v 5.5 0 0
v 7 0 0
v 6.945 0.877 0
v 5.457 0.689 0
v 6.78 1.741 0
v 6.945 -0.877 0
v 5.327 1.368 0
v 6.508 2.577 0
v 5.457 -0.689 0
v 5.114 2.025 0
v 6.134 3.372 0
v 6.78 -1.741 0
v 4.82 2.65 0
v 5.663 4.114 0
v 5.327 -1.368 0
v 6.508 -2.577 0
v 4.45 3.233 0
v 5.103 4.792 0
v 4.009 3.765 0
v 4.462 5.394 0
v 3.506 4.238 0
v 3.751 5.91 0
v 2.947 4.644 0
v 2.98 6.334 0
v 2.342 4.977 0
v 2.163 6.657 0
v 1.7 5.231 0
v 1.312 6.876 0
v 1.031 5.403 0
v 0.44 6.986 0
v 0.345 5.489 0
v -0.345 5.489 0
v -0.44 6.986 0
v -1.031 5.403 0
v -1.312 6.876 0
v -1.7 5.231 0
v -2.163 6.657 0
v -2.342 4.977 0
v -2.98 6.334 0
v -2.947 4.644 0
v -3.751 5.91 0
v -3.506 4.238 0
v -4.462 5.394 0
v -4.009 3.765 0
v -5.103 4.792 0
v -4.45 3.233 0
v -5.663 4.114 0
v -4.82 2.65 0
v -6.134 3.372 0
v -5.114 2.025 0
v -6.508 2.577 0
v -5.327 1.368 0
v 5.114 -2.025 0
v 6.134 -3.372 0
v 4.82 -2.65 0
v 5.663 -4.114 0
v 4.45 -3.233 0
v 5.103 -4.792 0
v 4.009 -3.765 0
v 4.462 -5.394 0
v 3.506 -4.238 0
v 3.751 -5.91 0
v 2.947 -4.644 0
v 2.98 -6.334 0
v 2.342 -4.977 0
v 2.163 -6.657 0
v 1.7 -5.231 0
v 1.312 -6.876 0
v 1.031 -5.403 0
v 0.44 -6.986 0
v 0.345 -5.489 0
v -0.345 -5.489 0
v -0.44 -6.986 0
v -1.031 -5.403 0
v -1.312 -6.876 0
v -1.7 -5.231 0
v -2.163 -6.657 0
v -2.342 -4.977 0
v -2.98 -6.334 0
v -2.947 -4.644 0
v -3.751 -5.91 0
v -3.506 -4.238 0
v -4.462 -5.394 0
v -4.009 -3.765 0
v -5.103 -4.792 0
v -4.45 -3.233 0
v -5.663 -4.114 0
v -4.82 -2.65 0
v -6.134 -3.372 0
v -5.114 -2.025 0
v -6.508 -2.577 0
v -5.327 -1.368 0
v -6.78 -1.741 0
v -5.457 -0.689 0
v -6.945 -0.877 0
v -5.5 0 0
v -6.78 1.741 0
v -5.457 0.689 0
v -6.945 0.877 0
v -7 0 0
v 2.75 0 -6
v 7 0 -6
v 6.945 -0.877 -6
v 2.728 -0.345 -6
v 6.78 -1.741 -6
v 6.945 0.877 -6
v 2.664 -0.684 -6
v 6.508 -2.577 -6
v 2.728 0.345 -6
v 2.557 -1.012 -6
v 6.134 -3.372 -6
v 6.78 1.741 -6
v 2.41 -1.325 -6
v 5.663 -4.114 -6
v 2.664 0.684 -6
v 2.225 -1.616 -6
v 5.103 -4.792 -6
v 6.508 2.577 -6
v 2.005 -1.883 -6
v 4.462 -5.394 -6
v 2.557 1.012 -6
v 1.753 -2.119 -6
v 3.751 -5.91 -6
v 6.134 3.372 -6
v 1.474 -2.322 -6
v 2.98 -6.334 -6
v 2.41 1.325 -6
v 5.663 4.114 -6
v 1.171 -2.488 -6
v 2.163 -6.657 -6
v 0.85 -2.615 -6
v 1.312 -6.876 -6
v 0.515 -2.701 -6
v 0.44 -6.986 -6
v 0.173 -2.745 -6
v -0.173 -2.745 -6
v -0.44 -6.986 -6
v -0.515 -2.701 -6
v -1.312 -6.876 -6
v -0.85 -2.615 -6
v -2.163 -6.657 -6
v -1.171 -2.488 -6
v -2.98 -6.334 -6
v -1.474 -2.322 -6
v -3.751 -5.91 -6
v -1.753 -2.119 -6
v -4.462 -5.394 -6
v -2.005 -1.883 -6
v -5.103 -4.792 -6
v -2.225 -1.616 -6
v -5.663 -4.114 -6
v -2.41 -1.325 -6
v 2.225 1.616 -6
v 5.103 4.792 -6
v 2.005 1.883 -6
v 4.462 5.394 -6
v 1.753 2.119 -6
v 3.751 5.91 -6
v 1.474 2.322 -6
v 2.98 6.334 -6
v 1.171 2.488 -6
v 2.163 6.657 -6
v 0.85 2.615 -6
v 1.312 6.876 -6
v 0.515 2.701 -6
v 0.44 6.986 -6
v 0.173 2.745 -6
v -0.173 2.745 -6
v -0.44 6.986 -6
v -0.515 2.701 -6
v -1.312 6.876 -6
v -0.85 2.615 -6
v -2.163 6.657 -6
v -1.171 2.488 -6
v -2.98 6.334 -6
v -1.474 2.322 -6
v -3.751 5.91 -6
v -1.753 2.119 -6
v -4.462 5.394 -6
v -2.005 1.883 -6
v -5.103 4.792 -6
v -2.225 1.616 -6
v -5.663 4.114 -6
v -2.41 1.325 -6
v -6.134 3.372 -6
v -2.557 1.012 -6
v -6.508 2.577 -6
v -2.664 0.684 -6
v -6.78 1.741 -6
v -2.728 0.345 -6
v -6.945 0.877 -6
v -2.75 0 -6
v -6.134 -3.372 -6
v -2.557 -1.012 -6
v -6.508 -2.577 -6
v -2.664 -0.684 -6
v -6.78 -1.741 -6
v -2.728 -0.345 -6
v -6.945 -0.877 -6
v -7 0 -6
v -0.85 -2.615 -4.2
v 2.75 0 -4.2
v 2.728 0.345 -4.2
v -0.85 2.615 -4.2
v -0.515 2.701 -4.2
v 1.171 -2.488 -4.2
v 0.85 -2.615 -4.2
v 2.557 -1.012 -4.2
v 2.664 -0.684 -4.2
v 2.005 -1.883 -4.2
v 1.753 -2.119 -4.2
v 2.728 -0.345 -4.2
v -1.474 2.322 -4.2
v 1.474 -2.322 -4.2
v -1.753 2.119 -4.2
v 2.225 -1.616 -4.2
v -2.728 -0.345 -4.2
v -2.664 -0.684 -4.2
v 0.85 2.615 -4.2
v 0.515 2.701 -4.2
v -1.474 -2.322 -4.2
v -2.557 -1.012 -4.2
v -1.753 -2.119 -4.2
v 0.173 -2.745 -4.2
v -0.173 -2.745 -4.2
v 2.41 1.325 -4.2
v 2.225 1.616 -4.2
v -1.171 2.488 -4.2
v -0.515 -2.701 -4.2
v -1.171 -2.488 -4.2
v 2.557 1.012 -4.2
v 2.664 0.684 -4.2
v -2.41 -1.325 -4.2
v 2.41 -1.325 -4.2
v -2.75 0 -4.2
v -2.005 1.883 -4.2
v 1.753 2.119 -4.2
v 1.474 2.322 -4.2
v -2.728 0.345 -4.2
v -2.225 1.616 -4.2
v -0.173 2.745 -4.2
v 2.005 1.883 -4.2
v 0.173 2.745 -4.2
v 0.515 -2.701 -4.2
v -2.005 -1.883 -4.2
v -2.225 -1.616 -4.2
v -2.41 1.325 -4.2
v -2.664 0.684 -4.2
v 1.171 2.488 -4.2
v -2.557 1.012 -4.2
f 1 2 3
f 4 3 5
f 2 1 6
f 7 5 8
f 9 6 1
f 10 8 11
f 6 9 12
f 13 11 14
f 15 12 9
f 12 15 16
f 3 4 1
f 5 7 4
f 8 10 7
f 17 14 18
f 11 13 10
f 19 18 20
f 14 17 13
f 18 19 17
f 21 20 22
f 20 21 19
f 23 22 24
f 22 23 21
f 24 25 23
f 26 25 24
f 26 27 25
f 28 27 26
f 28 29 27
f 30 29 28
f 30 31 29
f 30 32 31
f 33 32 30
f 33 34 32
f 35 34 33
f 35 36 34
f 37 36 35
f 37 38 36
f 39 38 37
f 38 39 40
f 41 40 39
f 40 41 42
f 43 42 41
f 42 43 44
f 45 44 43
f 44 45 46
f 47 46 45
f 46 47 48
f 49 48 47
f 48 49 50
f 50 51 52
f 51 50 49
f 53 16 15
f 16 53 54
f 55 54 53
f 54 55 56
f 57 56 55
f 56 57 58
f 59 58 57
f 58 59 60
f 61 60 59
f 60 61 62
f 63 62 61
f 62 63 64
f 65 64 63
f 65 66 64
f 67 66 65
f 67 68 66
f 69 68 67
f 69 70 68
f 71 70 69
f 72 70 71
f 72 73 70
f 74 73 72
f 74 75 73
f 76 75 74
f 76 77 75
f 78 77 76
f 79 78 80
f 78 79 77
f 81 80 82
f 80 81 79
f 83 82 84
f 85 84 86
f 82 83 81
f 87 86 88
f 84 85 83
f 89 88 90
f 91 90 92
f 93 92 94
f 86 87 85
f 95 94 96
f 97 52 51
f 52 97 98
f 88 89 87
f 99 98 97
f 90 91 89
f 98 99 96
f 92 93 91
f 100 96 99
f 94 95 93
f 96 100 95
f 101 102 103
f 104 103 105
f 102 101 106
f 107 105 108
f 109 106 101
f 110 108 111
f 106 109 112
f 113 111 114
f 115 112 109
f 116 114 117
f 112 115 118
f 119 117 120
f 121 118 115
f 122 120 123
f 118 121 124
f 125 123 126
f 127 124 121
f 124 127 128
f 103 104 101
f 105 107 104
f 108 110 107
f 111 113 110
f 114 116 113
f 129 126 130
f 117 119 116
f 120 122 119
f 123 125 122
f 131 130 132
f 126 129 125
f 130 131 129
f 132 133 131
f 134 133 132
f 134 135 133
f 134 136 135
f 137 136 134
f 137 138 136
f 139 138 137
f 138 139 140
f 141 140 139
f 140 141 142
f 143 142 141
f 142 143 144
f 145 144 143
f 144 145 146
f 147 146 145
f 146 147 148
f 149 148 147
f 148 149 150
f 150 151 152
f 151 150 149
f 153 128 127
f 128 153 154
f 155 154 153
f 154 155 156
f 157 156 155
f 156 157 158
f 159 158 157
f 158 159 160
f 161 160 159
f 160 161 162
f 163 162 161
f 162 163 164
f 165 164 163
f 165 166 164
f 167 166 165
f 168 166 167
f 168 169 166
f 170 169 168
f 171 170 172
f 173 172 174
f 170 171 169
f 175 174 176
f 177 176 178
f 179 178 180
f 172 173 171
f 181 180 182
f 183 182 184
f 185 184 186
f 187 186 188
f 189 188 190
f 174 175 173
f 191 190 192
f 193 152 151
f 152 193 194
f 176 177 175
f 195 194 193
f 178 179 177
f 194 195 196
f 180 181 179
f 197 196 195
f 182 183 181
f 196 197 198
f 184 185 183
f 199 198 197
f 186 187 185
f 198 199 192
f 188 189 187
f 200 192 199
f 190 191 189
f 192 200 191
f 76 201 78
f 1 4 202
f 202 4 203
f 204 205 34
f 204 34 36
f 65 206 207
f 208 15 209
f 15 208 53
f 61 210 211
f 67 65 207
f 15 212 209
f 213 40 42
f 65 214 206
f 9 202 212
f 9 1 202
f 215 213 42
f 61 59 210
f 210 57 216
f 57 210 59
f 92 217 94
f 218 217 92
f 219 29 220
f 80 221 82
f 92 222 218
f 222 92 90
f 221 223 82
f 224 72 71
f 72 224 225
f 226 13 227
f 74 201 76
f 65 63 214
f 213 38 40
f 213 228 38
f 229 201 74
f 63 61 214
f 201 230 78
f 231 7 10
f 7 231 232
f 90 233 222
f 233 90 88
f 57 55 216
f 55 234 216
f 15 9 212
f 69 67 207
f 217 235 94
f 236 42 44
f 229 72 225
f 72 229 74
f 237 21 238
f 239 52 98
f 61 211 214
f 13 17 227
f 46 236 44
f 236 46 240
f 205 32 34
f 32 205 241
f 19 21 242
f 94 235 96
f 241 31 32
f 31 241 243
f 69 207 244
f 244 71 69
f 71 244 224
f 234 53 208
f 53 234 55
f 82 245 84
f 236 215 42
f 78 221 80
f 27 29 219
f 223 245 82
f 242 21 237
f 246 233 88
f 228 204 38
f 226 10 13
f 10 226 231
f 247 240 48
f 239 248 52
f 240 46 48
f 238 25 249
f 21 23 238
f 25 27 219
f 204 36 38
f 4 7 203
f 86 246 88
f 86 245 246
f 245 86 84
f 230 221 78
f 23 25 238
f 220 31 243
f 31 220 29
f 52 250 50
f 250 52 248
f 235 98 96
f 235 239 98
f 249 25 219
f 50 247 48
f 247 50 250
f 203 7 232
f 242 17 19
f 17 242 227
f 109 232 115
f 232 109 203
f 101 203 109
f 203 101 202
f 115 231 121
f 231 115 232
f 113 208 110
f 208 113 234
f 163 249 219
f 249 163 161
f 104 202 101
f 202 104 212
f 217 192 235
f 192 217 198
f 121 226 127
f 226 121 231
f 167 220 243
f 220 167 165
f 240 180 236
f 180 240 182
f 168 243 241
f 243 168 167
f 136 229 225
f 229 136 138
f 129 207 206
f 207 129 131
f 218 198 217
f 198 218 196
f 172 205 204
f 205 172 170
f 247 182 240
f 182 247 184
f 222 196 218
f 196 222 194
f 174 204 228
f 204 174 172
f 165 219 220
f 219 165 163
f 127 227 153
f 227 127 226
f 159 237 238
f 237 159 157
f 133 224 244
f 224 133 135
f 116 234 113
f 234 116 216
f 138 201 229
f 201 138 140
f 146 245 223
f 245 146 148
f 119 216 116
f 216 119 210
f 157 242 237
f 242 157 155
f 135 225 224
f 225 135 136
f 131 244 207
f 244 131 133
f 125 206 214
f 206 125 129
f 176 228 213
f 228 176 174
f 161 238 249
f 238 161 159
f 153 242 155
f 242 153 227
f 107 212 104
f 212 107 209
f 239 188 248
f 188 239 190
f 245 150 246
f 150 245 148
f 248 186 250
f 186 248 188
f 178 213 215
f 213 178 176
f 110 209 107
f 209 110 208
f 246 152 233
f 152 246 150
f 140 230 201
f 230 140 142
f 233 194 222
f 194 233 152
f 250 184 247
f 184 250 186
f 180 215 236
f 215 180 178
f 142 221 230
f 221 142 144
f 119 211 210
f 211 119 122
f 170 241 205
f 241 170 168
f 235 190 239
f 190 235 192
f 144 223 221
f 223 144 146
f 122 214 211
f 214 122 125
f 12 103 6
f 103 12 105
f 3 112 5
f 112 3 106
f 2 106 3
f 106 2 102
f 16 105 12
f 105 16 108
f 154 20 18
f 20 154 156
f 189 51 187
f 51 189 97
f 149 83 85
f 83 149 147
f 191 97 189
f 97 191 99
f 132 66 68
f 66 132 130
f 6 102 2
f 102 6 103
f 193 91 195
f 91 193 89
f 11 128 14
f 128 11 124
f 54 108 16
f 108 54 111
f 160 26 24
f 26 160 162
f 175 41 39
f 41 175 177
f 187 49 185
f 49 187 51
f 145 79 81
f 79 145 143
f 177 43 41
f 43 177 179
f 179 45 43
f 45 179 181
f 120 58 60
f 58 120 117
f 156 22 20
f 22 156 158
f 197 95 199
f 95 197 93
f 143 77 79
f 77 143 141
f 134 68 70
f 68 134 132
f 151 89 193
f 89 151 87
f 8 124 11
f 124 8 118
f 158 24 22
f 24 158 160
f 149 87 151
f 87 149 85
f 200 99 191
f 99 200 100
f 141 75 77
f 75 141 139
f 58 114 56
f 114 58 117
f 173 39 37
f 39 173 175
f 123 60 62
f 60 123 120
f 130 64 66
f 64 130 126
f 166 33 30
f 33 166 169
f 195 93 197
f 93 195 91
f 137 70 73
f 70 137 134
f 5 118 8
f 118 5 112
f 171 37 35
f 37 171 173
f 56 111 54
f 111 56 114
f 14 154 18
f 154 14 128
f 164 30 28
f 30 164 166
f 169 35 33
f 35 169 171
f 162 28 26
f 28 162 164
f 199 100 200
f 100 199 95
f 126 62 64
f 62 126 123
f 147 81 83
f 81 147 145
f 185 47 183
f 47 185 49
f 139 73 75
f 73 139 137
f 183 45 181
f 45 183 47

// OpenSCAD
$fn = 50;


difference() {
	union() {
		translate(v = [0, 0, -6.0000000000]) {
			cylinder(h = 6, r = 7.0000000000);
		}
		cylinder(h = 0, r = 13.0000000000);
	}
	union() {
		translate(v = [0, 0, 0]) {
			rotate(a = [0, 0, 0]) {
				difference() {
					union() {
						#translate(v = [0, 0, -6.0000000000]) {
							cylinder(h = 6, r = 2.2500000000);
						}
						#translate(v = [0, 0, -4.2000000000]) {
							cylinder(h = 4.2000000000, r1 = 2.7500000000, r2 = 5.5000000000);
						}
						#translate(v = [0, 0, -6.0000000000]) {
							cylinder(h = 6, r = 2.7500000000);
						}
						#translate(v = [0, 0, -6.0000000000]) {
							cylinder(h = 6, r = 2.2500000000);
						}
					}
					union();
				}
			}
		}
	}
}
